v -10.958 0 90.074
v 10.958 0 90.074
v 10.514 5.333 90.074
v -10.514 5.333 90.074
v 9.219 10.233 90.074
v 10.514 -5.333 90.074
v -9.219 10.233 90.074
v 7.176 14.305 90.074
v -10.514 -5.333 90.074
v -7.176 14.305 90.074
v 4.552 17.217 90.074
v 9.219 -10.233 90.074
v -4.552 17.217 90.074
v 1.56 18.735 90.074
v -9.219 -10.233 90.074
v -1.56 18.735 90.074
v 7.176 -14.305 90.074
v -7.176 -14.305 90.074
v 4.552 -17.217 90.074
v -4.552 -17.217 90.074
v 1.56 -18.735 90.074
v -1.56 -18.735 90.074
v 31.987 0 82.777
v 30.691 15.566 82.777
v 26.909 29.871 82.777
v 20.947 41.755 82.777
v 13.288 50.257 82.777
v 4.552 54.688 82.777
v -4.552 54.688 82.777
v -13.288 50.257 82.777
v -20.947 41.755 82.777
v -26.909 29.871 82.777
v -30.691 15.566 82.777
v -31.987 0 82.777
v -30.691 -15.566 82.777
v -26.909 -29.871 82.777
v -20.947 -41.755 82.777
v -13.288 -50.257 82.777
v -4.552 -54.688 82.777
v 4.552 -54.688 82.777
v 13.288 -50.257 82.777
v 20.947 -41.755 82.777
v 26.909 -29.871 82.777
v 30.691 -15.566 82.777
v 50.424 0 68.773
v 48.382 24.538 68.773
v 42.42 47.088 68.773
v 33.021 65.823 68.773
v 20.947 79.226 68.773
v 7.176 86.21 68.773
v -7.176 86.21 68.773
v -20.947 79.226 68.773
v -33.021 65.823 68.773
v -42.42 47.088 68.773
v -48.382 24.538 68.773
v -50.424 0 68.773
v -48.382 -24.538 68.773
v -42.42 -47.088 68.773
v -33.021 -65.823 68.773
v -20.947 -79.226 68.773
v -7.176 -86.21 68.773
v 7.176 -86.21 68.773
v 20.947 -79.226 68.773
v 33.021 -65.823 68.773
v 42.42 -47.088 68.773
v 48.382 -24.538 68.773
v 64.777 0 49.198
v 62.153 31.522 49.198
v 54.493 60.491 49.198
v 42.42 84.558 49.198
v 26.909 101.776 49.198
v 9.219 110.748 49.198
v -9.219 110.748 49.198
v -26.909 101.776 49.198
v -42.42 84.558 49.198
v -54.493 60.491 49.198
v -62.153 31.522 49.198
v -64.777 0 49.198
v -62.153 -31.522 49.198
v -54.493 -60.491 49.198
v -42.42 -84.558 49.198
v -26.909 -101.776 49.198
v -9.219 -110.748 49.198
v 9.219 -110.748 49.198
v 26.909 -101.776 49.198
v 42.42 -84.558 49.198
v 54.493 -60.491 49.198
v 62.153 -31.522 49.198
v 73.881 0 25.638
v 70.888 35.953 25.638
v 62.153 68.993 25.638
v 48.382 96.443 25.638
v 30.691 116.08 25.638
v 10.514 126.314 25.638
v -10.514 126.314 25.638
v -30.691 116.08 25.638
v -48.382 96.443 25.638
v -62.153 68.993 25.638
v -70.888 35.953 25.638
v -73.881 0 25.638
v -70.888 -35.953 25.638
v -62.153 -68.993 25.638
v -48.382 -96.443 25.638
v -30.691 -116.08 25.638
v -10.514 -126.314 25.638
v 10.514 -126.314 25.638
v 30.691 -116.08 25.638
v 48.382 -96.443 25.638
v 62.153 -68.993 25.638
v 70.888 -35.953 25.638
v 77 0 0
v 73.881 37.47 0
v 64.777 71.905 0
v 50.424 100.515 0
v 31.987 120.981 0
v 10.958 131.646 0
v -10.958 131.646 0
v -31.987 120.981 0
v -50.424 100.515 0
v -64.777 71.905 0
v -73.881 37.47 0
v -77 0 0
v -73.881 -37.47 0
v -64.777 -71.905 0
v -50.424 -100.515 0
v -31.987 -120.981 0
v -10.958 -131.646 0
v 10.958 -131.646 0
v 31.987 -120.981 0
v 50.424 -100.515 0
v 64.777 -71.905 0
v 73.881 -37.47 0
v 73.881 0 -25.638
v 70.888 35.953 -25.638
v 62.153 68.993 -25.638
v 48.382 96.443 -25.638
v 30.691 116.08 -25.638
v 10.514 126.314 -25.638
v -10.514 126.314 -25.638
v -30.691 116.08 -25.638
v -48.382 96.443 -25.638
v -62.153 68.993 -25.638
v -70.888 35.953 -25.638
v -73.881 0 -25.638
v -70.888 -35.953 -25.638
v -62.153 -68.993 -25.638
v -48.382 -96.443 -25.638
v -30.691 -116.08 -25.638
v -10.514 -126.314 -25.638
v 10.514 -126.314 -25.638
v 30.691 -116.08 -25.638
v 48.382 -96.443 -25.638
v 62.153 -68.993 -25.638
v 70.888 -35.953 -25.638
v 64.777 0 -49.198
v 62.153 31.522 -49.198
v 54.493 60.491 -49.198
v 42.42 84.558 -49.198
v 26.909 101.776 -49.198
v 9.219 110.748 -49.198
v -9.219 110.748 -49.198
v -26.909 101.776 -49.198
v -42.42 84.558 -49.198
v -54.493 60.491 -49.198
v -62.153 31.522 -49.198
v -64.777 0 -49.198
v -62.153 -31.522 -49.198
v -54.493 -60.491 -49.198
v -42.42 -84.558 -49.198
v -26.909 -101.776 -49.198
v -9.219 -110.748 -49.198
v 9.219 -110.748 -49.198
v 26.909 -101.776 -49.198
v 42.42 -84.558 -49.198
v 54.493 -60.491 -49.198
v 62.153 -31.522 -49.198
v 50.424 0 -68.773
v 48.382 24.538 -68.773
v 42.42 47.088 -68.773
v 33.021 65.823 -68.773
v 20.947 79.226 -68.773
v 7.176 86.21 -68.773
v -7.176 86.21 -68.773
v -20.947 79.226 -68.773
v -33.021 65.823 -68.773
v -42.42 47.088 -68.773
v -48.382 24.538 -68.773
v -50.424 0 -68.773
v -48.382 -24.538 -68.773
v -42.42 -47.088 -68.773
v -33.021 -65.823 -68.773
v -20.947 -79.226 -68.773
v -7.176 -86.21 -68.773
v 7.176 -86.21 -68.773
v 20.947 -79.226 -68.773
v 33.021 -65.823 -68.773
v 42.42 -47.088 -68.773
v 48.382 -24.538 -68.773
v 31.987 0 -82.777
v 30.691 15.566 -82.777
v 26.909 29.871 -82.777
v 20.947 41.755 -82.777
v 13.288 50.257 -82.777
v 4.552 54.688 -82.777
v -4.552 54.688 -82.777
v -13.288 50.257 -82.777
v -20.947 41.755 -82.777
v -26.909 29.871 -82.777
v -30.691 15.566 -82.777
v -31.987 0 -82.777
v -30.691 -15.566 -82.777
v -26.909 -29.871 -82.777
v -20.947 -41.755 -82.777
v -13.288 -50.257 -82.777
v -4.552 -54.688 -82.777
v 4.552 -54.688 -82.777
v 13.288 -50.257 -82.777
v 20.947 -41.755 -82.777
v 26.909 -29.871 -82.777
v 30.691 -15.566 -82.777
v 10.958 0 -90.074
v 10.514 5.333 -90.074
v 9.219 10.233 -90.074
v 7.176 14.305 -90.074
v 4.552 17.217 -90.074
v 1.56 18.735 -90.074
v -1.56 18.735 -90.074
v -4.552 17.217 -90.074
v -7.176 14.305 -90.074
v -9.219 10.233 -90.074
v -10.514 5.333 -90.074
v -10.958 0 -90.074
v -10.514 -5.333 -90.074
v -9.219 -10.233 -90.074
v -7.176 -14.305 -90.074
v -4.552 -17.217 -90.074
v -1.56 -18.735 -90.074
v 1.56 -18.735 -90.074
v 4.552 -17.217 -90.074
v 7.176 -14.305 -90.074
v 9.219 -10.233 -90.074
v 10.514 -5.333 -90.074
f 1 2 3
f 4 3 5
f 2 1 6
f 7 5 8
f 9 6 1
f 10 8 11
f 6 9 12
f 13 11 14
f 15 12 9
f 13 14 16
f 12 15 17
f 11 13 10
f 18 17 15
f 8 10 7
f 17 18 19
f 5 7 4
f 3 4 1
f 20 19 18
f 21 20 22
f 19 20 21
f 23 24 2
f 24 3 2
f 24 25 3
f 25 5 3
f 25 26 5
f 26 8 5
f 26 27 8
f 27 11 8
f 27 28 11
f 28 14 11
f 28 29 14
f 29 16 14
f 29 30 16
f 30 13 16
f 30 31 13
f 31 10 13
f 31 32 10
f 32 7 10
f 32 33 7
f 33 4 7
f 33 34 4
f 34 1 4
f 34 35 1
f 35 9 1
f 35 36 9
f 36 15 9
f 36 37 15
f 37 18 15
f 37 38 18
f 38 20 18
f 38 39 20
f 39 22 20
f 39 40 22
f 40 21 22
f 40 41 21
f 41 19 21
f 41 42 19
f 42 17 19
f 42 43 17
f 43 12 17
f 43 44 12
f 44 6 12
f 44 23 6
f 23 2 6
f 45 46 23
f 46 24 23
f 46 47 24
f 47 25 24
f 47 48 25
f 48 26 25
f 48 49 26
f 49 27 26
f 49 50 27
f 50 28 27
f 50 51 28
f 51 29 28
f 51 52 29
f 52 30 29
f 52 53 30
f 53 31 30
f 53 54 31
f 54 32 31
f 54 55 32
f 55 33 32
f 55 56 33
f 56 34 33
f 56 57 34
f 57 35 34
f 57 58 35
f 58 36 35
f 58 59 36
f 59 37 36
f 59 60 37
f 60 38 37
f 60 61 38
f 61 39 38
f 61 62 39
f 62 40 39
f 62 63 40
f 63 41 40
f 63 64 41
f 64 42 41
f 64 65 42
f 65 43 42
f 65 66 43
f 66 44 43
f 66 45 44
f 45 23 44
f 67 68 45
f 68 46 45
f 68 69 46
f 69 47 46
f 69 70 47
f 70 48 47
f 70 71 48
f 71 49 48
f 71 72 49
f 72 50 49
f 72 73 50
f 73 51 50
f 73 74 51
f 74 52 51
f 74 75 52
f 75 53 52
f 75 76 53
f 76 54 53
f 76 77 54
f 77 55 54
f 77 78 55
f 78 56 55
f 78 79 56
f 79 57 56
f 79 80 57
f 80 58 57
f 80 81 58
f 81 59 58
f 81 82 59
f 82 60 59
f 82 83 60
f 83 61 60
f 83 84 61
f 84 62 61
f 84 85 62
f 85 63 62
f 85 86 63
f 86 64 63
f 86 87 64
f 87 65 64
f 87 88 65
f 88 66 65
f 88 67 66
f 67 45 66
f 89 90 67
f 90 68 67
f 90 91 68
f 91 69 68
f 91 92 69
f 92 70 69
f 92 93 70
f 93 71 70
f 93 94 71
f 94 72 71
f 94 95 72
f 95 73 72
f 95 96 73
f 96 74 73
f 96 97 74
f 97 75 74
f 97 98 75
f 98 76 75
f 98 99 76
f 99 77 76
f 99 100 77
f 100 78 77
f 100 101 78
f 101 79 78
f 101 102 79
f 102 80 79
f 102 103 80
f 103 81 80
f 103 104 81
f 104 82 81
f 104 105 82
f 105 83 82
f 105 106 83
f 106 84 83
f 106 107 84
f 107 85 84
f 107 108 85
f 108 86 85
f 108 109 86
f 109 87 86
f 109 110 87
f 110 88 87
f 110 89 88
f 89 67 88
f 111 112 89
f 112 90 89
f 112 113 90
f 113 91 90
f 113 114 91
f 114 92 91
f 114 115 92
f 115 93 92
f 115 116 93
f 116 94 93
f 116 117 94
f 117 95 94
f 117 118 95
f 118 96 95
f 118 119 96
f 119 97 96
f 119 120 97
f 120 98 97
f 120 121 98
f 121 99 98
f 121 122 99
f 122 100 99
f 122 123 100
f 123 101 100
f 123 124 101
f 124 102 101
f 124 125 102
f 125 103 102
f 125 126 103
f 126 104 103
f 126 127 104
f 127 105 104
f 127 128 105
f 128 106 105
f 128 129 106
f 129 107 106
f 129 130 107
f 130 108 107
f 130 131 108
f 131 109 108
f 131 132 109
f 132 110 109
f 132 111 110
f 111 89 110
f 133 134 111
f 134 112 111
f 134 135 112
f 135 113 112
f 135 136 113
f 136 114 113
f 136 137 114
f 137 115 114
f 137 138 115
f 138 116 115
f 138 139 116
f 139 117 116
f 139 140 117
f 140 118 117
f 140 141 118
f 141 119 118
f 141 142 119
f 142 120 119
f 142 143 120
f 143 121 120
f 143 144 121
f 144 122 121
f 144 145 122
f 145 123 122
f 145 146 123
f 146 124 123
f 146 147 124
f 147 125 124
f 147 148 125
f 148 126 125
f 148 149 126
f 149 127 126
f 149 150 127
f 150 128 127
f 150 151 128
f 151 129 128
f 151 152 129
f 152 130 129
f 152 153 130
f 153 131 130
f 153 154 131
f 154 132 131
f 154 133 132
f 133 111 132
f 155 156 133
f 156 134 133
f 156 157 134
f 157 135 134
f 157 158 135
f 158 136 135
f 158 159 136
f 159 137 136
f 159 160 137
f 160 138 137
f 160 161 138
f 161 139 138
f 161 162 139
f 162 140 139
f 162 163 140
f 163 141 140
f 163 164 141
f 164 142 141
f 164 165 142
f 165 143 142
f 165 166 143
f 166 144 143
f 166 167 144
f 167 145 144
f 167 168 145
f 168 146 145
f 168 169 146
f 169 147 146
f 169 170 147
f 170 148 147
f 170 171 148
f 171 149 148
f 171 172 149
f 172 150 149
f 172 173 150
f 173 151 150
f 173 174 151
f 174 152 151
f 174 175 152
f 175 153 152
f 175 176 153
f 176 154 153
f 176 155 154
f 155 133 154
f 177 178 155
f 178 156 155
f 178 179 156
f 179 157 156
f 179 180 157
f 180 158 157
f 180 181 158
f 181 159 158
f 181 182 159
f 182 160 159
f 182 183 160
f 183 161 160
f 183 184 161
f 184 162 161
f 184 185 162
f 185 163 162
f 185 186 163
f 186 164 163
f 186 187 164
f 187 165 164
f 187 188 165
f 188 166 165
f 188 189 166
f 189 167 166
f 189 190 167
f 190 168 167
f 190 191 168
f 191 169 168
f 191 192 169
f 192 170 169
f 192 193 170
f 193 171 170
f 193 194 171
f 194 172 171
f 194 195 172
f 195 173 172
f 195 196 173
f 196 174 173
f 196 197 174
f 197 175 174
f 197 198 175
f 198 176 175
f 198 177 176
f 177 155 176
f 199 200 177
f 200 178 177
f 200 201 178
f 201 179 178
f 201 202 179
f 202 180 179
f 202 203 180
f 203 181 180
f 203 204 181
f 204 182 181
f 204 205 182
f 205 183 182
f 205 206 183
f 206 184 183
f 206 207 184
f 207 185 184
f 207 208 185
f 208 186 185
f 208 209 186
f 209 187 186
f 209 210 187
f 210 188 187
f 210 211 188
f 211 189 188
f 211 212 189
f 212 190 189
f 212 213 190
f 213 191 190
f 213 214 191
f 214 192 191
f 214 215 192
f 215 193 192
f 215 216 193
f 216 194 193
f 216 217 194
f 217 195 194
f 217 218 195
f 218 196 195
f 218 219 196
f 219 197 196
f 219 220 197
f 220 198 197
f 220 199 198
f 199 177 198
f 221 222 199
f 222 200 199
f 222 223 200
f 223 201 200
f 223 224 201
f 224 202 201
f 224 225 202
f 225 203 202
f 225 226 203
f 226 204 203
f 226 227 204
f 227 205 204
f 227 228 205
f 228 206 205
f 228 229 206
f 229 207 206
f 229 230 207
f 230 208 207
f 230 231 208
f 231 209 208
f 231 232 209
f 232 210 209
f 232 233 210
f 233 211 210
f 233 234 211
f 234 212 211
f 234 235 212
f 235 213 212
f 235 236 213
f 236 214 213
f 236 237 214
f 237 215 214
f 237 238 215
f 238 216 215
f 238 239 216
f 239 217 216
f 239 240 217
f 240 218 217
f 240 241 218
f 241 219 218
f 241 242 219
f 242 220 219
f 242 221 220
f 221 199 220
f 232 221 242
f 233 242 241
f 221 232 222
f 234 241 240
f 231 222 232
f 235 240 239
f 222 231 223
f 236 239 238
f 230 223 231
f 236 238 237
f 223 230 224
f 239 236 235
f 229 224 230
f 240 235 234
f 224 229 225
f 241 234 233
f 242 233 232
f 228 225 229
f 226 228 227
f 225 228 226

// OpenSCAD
// Generated by SolidPython 1.0.1 on 2020-07-29 00:46:50


scale(v = [11, 19, 13]) {
	sphere(r = 7);
}
/***********************************************
*********      SolidPython code:      **********
************************************************
 
# import packages: SolidPython
from solid import *
from solid.utils import *
from itertools import chain, combinations, permutations


class Resize:

    def __init__(self, scad_file):
        self.scad_file = scad_file
        #self.scad_file = import_scad(scad_file)
        # cone/cylinder param:
        self.r1 = 0
        self.r2 = 0
        self.h = 0
        # rectangular prism param:
        self.w = 0
        self.l = 0
        # ellipse param:
        self.r = 0

    # import OpenScad code (file name corresponds to shape)


    # classify shape + parameters
    def assign(self, param1, param2, param3):
        if self.scad_file == 'cone.scad':
            self.r1 = param1
            self.r2 = param2
            self.h = param3
        elif self.scad_file == 'cylinder.scad':
            self.r1 = param1
            self.r2 = param2
            self.h = param3
        elif self.scad_file == 'rectangularPrism.scad':
            self.h = param1
            self.l = param2
            self.w = param3
        else:
            self.r = param1
            self.h = param2

    # resize parameters
    def iterate(self):
        x = range(3, 20, 2)
        i = 1
        if self.scad_file == 'cone.scad':
            tempList = list(permutations(x, 2))
            for temp in tempList:
                param1 = temp[0]
                param2 = temp[1]
                filepath = 'produced_scad_files/' + 'cone' + str(param1) + '_' + str(param2) + '_' + '.scad'
                scad_render_to_file(cylinder(h=param1, r1=param2, r2=0), filepath)

        elif self.scad_file == 'cylinder.scad':
            tempList = list(permutations(x, 3))
            for temp in tempList:
                param1 = temp[0]
                param2 = temp[1]
                filepath = 'produced_scad_files/' + 'cylinder' + str(param1) + '_' + str(param2) + '_' + '.scad'
                scad_render_to_file(cylinder(h=param1, r1=param2, r2=param2), filepath)

        elif self.scad_file == 'rectangularPrism.scad':
            tempList = list(permutations(x, 3))
            for temp in tempList:
                param1 = temp[0]
                param2 = temp[1]
                param3 = temp[2]
                filepath = 'produced_scad_files/' + 'rectangularPrism' + str(param1) + '_' + str(param2) + '_' + str(
                    param3) + '.scad'
                scad_render_to_file(cube(size=(param1, param2, param3)), filepath)

        elif self.scad_file == 'ellipse.scad':
            tempList = list(permutations(x, 4))
            for temp in tempList:
                param1 = temp[0]
                param2 = temp[1]
                param3 = temp[2]
                param4 = temp[3]
                filepath = 'produced_scad_files/' + 'ellipse' + str(param1) + '_' + str(param2) + '_' + str(param3) + '_' + str(param4) + '.scad'
                scad_render_to_file(scale([param1, param2, param3])(sphere(r=param4)), filepath)

    def render_to_scadfile(self):
        scad_render_to_file(scad, 'example.scad') 
 
************************************************/
